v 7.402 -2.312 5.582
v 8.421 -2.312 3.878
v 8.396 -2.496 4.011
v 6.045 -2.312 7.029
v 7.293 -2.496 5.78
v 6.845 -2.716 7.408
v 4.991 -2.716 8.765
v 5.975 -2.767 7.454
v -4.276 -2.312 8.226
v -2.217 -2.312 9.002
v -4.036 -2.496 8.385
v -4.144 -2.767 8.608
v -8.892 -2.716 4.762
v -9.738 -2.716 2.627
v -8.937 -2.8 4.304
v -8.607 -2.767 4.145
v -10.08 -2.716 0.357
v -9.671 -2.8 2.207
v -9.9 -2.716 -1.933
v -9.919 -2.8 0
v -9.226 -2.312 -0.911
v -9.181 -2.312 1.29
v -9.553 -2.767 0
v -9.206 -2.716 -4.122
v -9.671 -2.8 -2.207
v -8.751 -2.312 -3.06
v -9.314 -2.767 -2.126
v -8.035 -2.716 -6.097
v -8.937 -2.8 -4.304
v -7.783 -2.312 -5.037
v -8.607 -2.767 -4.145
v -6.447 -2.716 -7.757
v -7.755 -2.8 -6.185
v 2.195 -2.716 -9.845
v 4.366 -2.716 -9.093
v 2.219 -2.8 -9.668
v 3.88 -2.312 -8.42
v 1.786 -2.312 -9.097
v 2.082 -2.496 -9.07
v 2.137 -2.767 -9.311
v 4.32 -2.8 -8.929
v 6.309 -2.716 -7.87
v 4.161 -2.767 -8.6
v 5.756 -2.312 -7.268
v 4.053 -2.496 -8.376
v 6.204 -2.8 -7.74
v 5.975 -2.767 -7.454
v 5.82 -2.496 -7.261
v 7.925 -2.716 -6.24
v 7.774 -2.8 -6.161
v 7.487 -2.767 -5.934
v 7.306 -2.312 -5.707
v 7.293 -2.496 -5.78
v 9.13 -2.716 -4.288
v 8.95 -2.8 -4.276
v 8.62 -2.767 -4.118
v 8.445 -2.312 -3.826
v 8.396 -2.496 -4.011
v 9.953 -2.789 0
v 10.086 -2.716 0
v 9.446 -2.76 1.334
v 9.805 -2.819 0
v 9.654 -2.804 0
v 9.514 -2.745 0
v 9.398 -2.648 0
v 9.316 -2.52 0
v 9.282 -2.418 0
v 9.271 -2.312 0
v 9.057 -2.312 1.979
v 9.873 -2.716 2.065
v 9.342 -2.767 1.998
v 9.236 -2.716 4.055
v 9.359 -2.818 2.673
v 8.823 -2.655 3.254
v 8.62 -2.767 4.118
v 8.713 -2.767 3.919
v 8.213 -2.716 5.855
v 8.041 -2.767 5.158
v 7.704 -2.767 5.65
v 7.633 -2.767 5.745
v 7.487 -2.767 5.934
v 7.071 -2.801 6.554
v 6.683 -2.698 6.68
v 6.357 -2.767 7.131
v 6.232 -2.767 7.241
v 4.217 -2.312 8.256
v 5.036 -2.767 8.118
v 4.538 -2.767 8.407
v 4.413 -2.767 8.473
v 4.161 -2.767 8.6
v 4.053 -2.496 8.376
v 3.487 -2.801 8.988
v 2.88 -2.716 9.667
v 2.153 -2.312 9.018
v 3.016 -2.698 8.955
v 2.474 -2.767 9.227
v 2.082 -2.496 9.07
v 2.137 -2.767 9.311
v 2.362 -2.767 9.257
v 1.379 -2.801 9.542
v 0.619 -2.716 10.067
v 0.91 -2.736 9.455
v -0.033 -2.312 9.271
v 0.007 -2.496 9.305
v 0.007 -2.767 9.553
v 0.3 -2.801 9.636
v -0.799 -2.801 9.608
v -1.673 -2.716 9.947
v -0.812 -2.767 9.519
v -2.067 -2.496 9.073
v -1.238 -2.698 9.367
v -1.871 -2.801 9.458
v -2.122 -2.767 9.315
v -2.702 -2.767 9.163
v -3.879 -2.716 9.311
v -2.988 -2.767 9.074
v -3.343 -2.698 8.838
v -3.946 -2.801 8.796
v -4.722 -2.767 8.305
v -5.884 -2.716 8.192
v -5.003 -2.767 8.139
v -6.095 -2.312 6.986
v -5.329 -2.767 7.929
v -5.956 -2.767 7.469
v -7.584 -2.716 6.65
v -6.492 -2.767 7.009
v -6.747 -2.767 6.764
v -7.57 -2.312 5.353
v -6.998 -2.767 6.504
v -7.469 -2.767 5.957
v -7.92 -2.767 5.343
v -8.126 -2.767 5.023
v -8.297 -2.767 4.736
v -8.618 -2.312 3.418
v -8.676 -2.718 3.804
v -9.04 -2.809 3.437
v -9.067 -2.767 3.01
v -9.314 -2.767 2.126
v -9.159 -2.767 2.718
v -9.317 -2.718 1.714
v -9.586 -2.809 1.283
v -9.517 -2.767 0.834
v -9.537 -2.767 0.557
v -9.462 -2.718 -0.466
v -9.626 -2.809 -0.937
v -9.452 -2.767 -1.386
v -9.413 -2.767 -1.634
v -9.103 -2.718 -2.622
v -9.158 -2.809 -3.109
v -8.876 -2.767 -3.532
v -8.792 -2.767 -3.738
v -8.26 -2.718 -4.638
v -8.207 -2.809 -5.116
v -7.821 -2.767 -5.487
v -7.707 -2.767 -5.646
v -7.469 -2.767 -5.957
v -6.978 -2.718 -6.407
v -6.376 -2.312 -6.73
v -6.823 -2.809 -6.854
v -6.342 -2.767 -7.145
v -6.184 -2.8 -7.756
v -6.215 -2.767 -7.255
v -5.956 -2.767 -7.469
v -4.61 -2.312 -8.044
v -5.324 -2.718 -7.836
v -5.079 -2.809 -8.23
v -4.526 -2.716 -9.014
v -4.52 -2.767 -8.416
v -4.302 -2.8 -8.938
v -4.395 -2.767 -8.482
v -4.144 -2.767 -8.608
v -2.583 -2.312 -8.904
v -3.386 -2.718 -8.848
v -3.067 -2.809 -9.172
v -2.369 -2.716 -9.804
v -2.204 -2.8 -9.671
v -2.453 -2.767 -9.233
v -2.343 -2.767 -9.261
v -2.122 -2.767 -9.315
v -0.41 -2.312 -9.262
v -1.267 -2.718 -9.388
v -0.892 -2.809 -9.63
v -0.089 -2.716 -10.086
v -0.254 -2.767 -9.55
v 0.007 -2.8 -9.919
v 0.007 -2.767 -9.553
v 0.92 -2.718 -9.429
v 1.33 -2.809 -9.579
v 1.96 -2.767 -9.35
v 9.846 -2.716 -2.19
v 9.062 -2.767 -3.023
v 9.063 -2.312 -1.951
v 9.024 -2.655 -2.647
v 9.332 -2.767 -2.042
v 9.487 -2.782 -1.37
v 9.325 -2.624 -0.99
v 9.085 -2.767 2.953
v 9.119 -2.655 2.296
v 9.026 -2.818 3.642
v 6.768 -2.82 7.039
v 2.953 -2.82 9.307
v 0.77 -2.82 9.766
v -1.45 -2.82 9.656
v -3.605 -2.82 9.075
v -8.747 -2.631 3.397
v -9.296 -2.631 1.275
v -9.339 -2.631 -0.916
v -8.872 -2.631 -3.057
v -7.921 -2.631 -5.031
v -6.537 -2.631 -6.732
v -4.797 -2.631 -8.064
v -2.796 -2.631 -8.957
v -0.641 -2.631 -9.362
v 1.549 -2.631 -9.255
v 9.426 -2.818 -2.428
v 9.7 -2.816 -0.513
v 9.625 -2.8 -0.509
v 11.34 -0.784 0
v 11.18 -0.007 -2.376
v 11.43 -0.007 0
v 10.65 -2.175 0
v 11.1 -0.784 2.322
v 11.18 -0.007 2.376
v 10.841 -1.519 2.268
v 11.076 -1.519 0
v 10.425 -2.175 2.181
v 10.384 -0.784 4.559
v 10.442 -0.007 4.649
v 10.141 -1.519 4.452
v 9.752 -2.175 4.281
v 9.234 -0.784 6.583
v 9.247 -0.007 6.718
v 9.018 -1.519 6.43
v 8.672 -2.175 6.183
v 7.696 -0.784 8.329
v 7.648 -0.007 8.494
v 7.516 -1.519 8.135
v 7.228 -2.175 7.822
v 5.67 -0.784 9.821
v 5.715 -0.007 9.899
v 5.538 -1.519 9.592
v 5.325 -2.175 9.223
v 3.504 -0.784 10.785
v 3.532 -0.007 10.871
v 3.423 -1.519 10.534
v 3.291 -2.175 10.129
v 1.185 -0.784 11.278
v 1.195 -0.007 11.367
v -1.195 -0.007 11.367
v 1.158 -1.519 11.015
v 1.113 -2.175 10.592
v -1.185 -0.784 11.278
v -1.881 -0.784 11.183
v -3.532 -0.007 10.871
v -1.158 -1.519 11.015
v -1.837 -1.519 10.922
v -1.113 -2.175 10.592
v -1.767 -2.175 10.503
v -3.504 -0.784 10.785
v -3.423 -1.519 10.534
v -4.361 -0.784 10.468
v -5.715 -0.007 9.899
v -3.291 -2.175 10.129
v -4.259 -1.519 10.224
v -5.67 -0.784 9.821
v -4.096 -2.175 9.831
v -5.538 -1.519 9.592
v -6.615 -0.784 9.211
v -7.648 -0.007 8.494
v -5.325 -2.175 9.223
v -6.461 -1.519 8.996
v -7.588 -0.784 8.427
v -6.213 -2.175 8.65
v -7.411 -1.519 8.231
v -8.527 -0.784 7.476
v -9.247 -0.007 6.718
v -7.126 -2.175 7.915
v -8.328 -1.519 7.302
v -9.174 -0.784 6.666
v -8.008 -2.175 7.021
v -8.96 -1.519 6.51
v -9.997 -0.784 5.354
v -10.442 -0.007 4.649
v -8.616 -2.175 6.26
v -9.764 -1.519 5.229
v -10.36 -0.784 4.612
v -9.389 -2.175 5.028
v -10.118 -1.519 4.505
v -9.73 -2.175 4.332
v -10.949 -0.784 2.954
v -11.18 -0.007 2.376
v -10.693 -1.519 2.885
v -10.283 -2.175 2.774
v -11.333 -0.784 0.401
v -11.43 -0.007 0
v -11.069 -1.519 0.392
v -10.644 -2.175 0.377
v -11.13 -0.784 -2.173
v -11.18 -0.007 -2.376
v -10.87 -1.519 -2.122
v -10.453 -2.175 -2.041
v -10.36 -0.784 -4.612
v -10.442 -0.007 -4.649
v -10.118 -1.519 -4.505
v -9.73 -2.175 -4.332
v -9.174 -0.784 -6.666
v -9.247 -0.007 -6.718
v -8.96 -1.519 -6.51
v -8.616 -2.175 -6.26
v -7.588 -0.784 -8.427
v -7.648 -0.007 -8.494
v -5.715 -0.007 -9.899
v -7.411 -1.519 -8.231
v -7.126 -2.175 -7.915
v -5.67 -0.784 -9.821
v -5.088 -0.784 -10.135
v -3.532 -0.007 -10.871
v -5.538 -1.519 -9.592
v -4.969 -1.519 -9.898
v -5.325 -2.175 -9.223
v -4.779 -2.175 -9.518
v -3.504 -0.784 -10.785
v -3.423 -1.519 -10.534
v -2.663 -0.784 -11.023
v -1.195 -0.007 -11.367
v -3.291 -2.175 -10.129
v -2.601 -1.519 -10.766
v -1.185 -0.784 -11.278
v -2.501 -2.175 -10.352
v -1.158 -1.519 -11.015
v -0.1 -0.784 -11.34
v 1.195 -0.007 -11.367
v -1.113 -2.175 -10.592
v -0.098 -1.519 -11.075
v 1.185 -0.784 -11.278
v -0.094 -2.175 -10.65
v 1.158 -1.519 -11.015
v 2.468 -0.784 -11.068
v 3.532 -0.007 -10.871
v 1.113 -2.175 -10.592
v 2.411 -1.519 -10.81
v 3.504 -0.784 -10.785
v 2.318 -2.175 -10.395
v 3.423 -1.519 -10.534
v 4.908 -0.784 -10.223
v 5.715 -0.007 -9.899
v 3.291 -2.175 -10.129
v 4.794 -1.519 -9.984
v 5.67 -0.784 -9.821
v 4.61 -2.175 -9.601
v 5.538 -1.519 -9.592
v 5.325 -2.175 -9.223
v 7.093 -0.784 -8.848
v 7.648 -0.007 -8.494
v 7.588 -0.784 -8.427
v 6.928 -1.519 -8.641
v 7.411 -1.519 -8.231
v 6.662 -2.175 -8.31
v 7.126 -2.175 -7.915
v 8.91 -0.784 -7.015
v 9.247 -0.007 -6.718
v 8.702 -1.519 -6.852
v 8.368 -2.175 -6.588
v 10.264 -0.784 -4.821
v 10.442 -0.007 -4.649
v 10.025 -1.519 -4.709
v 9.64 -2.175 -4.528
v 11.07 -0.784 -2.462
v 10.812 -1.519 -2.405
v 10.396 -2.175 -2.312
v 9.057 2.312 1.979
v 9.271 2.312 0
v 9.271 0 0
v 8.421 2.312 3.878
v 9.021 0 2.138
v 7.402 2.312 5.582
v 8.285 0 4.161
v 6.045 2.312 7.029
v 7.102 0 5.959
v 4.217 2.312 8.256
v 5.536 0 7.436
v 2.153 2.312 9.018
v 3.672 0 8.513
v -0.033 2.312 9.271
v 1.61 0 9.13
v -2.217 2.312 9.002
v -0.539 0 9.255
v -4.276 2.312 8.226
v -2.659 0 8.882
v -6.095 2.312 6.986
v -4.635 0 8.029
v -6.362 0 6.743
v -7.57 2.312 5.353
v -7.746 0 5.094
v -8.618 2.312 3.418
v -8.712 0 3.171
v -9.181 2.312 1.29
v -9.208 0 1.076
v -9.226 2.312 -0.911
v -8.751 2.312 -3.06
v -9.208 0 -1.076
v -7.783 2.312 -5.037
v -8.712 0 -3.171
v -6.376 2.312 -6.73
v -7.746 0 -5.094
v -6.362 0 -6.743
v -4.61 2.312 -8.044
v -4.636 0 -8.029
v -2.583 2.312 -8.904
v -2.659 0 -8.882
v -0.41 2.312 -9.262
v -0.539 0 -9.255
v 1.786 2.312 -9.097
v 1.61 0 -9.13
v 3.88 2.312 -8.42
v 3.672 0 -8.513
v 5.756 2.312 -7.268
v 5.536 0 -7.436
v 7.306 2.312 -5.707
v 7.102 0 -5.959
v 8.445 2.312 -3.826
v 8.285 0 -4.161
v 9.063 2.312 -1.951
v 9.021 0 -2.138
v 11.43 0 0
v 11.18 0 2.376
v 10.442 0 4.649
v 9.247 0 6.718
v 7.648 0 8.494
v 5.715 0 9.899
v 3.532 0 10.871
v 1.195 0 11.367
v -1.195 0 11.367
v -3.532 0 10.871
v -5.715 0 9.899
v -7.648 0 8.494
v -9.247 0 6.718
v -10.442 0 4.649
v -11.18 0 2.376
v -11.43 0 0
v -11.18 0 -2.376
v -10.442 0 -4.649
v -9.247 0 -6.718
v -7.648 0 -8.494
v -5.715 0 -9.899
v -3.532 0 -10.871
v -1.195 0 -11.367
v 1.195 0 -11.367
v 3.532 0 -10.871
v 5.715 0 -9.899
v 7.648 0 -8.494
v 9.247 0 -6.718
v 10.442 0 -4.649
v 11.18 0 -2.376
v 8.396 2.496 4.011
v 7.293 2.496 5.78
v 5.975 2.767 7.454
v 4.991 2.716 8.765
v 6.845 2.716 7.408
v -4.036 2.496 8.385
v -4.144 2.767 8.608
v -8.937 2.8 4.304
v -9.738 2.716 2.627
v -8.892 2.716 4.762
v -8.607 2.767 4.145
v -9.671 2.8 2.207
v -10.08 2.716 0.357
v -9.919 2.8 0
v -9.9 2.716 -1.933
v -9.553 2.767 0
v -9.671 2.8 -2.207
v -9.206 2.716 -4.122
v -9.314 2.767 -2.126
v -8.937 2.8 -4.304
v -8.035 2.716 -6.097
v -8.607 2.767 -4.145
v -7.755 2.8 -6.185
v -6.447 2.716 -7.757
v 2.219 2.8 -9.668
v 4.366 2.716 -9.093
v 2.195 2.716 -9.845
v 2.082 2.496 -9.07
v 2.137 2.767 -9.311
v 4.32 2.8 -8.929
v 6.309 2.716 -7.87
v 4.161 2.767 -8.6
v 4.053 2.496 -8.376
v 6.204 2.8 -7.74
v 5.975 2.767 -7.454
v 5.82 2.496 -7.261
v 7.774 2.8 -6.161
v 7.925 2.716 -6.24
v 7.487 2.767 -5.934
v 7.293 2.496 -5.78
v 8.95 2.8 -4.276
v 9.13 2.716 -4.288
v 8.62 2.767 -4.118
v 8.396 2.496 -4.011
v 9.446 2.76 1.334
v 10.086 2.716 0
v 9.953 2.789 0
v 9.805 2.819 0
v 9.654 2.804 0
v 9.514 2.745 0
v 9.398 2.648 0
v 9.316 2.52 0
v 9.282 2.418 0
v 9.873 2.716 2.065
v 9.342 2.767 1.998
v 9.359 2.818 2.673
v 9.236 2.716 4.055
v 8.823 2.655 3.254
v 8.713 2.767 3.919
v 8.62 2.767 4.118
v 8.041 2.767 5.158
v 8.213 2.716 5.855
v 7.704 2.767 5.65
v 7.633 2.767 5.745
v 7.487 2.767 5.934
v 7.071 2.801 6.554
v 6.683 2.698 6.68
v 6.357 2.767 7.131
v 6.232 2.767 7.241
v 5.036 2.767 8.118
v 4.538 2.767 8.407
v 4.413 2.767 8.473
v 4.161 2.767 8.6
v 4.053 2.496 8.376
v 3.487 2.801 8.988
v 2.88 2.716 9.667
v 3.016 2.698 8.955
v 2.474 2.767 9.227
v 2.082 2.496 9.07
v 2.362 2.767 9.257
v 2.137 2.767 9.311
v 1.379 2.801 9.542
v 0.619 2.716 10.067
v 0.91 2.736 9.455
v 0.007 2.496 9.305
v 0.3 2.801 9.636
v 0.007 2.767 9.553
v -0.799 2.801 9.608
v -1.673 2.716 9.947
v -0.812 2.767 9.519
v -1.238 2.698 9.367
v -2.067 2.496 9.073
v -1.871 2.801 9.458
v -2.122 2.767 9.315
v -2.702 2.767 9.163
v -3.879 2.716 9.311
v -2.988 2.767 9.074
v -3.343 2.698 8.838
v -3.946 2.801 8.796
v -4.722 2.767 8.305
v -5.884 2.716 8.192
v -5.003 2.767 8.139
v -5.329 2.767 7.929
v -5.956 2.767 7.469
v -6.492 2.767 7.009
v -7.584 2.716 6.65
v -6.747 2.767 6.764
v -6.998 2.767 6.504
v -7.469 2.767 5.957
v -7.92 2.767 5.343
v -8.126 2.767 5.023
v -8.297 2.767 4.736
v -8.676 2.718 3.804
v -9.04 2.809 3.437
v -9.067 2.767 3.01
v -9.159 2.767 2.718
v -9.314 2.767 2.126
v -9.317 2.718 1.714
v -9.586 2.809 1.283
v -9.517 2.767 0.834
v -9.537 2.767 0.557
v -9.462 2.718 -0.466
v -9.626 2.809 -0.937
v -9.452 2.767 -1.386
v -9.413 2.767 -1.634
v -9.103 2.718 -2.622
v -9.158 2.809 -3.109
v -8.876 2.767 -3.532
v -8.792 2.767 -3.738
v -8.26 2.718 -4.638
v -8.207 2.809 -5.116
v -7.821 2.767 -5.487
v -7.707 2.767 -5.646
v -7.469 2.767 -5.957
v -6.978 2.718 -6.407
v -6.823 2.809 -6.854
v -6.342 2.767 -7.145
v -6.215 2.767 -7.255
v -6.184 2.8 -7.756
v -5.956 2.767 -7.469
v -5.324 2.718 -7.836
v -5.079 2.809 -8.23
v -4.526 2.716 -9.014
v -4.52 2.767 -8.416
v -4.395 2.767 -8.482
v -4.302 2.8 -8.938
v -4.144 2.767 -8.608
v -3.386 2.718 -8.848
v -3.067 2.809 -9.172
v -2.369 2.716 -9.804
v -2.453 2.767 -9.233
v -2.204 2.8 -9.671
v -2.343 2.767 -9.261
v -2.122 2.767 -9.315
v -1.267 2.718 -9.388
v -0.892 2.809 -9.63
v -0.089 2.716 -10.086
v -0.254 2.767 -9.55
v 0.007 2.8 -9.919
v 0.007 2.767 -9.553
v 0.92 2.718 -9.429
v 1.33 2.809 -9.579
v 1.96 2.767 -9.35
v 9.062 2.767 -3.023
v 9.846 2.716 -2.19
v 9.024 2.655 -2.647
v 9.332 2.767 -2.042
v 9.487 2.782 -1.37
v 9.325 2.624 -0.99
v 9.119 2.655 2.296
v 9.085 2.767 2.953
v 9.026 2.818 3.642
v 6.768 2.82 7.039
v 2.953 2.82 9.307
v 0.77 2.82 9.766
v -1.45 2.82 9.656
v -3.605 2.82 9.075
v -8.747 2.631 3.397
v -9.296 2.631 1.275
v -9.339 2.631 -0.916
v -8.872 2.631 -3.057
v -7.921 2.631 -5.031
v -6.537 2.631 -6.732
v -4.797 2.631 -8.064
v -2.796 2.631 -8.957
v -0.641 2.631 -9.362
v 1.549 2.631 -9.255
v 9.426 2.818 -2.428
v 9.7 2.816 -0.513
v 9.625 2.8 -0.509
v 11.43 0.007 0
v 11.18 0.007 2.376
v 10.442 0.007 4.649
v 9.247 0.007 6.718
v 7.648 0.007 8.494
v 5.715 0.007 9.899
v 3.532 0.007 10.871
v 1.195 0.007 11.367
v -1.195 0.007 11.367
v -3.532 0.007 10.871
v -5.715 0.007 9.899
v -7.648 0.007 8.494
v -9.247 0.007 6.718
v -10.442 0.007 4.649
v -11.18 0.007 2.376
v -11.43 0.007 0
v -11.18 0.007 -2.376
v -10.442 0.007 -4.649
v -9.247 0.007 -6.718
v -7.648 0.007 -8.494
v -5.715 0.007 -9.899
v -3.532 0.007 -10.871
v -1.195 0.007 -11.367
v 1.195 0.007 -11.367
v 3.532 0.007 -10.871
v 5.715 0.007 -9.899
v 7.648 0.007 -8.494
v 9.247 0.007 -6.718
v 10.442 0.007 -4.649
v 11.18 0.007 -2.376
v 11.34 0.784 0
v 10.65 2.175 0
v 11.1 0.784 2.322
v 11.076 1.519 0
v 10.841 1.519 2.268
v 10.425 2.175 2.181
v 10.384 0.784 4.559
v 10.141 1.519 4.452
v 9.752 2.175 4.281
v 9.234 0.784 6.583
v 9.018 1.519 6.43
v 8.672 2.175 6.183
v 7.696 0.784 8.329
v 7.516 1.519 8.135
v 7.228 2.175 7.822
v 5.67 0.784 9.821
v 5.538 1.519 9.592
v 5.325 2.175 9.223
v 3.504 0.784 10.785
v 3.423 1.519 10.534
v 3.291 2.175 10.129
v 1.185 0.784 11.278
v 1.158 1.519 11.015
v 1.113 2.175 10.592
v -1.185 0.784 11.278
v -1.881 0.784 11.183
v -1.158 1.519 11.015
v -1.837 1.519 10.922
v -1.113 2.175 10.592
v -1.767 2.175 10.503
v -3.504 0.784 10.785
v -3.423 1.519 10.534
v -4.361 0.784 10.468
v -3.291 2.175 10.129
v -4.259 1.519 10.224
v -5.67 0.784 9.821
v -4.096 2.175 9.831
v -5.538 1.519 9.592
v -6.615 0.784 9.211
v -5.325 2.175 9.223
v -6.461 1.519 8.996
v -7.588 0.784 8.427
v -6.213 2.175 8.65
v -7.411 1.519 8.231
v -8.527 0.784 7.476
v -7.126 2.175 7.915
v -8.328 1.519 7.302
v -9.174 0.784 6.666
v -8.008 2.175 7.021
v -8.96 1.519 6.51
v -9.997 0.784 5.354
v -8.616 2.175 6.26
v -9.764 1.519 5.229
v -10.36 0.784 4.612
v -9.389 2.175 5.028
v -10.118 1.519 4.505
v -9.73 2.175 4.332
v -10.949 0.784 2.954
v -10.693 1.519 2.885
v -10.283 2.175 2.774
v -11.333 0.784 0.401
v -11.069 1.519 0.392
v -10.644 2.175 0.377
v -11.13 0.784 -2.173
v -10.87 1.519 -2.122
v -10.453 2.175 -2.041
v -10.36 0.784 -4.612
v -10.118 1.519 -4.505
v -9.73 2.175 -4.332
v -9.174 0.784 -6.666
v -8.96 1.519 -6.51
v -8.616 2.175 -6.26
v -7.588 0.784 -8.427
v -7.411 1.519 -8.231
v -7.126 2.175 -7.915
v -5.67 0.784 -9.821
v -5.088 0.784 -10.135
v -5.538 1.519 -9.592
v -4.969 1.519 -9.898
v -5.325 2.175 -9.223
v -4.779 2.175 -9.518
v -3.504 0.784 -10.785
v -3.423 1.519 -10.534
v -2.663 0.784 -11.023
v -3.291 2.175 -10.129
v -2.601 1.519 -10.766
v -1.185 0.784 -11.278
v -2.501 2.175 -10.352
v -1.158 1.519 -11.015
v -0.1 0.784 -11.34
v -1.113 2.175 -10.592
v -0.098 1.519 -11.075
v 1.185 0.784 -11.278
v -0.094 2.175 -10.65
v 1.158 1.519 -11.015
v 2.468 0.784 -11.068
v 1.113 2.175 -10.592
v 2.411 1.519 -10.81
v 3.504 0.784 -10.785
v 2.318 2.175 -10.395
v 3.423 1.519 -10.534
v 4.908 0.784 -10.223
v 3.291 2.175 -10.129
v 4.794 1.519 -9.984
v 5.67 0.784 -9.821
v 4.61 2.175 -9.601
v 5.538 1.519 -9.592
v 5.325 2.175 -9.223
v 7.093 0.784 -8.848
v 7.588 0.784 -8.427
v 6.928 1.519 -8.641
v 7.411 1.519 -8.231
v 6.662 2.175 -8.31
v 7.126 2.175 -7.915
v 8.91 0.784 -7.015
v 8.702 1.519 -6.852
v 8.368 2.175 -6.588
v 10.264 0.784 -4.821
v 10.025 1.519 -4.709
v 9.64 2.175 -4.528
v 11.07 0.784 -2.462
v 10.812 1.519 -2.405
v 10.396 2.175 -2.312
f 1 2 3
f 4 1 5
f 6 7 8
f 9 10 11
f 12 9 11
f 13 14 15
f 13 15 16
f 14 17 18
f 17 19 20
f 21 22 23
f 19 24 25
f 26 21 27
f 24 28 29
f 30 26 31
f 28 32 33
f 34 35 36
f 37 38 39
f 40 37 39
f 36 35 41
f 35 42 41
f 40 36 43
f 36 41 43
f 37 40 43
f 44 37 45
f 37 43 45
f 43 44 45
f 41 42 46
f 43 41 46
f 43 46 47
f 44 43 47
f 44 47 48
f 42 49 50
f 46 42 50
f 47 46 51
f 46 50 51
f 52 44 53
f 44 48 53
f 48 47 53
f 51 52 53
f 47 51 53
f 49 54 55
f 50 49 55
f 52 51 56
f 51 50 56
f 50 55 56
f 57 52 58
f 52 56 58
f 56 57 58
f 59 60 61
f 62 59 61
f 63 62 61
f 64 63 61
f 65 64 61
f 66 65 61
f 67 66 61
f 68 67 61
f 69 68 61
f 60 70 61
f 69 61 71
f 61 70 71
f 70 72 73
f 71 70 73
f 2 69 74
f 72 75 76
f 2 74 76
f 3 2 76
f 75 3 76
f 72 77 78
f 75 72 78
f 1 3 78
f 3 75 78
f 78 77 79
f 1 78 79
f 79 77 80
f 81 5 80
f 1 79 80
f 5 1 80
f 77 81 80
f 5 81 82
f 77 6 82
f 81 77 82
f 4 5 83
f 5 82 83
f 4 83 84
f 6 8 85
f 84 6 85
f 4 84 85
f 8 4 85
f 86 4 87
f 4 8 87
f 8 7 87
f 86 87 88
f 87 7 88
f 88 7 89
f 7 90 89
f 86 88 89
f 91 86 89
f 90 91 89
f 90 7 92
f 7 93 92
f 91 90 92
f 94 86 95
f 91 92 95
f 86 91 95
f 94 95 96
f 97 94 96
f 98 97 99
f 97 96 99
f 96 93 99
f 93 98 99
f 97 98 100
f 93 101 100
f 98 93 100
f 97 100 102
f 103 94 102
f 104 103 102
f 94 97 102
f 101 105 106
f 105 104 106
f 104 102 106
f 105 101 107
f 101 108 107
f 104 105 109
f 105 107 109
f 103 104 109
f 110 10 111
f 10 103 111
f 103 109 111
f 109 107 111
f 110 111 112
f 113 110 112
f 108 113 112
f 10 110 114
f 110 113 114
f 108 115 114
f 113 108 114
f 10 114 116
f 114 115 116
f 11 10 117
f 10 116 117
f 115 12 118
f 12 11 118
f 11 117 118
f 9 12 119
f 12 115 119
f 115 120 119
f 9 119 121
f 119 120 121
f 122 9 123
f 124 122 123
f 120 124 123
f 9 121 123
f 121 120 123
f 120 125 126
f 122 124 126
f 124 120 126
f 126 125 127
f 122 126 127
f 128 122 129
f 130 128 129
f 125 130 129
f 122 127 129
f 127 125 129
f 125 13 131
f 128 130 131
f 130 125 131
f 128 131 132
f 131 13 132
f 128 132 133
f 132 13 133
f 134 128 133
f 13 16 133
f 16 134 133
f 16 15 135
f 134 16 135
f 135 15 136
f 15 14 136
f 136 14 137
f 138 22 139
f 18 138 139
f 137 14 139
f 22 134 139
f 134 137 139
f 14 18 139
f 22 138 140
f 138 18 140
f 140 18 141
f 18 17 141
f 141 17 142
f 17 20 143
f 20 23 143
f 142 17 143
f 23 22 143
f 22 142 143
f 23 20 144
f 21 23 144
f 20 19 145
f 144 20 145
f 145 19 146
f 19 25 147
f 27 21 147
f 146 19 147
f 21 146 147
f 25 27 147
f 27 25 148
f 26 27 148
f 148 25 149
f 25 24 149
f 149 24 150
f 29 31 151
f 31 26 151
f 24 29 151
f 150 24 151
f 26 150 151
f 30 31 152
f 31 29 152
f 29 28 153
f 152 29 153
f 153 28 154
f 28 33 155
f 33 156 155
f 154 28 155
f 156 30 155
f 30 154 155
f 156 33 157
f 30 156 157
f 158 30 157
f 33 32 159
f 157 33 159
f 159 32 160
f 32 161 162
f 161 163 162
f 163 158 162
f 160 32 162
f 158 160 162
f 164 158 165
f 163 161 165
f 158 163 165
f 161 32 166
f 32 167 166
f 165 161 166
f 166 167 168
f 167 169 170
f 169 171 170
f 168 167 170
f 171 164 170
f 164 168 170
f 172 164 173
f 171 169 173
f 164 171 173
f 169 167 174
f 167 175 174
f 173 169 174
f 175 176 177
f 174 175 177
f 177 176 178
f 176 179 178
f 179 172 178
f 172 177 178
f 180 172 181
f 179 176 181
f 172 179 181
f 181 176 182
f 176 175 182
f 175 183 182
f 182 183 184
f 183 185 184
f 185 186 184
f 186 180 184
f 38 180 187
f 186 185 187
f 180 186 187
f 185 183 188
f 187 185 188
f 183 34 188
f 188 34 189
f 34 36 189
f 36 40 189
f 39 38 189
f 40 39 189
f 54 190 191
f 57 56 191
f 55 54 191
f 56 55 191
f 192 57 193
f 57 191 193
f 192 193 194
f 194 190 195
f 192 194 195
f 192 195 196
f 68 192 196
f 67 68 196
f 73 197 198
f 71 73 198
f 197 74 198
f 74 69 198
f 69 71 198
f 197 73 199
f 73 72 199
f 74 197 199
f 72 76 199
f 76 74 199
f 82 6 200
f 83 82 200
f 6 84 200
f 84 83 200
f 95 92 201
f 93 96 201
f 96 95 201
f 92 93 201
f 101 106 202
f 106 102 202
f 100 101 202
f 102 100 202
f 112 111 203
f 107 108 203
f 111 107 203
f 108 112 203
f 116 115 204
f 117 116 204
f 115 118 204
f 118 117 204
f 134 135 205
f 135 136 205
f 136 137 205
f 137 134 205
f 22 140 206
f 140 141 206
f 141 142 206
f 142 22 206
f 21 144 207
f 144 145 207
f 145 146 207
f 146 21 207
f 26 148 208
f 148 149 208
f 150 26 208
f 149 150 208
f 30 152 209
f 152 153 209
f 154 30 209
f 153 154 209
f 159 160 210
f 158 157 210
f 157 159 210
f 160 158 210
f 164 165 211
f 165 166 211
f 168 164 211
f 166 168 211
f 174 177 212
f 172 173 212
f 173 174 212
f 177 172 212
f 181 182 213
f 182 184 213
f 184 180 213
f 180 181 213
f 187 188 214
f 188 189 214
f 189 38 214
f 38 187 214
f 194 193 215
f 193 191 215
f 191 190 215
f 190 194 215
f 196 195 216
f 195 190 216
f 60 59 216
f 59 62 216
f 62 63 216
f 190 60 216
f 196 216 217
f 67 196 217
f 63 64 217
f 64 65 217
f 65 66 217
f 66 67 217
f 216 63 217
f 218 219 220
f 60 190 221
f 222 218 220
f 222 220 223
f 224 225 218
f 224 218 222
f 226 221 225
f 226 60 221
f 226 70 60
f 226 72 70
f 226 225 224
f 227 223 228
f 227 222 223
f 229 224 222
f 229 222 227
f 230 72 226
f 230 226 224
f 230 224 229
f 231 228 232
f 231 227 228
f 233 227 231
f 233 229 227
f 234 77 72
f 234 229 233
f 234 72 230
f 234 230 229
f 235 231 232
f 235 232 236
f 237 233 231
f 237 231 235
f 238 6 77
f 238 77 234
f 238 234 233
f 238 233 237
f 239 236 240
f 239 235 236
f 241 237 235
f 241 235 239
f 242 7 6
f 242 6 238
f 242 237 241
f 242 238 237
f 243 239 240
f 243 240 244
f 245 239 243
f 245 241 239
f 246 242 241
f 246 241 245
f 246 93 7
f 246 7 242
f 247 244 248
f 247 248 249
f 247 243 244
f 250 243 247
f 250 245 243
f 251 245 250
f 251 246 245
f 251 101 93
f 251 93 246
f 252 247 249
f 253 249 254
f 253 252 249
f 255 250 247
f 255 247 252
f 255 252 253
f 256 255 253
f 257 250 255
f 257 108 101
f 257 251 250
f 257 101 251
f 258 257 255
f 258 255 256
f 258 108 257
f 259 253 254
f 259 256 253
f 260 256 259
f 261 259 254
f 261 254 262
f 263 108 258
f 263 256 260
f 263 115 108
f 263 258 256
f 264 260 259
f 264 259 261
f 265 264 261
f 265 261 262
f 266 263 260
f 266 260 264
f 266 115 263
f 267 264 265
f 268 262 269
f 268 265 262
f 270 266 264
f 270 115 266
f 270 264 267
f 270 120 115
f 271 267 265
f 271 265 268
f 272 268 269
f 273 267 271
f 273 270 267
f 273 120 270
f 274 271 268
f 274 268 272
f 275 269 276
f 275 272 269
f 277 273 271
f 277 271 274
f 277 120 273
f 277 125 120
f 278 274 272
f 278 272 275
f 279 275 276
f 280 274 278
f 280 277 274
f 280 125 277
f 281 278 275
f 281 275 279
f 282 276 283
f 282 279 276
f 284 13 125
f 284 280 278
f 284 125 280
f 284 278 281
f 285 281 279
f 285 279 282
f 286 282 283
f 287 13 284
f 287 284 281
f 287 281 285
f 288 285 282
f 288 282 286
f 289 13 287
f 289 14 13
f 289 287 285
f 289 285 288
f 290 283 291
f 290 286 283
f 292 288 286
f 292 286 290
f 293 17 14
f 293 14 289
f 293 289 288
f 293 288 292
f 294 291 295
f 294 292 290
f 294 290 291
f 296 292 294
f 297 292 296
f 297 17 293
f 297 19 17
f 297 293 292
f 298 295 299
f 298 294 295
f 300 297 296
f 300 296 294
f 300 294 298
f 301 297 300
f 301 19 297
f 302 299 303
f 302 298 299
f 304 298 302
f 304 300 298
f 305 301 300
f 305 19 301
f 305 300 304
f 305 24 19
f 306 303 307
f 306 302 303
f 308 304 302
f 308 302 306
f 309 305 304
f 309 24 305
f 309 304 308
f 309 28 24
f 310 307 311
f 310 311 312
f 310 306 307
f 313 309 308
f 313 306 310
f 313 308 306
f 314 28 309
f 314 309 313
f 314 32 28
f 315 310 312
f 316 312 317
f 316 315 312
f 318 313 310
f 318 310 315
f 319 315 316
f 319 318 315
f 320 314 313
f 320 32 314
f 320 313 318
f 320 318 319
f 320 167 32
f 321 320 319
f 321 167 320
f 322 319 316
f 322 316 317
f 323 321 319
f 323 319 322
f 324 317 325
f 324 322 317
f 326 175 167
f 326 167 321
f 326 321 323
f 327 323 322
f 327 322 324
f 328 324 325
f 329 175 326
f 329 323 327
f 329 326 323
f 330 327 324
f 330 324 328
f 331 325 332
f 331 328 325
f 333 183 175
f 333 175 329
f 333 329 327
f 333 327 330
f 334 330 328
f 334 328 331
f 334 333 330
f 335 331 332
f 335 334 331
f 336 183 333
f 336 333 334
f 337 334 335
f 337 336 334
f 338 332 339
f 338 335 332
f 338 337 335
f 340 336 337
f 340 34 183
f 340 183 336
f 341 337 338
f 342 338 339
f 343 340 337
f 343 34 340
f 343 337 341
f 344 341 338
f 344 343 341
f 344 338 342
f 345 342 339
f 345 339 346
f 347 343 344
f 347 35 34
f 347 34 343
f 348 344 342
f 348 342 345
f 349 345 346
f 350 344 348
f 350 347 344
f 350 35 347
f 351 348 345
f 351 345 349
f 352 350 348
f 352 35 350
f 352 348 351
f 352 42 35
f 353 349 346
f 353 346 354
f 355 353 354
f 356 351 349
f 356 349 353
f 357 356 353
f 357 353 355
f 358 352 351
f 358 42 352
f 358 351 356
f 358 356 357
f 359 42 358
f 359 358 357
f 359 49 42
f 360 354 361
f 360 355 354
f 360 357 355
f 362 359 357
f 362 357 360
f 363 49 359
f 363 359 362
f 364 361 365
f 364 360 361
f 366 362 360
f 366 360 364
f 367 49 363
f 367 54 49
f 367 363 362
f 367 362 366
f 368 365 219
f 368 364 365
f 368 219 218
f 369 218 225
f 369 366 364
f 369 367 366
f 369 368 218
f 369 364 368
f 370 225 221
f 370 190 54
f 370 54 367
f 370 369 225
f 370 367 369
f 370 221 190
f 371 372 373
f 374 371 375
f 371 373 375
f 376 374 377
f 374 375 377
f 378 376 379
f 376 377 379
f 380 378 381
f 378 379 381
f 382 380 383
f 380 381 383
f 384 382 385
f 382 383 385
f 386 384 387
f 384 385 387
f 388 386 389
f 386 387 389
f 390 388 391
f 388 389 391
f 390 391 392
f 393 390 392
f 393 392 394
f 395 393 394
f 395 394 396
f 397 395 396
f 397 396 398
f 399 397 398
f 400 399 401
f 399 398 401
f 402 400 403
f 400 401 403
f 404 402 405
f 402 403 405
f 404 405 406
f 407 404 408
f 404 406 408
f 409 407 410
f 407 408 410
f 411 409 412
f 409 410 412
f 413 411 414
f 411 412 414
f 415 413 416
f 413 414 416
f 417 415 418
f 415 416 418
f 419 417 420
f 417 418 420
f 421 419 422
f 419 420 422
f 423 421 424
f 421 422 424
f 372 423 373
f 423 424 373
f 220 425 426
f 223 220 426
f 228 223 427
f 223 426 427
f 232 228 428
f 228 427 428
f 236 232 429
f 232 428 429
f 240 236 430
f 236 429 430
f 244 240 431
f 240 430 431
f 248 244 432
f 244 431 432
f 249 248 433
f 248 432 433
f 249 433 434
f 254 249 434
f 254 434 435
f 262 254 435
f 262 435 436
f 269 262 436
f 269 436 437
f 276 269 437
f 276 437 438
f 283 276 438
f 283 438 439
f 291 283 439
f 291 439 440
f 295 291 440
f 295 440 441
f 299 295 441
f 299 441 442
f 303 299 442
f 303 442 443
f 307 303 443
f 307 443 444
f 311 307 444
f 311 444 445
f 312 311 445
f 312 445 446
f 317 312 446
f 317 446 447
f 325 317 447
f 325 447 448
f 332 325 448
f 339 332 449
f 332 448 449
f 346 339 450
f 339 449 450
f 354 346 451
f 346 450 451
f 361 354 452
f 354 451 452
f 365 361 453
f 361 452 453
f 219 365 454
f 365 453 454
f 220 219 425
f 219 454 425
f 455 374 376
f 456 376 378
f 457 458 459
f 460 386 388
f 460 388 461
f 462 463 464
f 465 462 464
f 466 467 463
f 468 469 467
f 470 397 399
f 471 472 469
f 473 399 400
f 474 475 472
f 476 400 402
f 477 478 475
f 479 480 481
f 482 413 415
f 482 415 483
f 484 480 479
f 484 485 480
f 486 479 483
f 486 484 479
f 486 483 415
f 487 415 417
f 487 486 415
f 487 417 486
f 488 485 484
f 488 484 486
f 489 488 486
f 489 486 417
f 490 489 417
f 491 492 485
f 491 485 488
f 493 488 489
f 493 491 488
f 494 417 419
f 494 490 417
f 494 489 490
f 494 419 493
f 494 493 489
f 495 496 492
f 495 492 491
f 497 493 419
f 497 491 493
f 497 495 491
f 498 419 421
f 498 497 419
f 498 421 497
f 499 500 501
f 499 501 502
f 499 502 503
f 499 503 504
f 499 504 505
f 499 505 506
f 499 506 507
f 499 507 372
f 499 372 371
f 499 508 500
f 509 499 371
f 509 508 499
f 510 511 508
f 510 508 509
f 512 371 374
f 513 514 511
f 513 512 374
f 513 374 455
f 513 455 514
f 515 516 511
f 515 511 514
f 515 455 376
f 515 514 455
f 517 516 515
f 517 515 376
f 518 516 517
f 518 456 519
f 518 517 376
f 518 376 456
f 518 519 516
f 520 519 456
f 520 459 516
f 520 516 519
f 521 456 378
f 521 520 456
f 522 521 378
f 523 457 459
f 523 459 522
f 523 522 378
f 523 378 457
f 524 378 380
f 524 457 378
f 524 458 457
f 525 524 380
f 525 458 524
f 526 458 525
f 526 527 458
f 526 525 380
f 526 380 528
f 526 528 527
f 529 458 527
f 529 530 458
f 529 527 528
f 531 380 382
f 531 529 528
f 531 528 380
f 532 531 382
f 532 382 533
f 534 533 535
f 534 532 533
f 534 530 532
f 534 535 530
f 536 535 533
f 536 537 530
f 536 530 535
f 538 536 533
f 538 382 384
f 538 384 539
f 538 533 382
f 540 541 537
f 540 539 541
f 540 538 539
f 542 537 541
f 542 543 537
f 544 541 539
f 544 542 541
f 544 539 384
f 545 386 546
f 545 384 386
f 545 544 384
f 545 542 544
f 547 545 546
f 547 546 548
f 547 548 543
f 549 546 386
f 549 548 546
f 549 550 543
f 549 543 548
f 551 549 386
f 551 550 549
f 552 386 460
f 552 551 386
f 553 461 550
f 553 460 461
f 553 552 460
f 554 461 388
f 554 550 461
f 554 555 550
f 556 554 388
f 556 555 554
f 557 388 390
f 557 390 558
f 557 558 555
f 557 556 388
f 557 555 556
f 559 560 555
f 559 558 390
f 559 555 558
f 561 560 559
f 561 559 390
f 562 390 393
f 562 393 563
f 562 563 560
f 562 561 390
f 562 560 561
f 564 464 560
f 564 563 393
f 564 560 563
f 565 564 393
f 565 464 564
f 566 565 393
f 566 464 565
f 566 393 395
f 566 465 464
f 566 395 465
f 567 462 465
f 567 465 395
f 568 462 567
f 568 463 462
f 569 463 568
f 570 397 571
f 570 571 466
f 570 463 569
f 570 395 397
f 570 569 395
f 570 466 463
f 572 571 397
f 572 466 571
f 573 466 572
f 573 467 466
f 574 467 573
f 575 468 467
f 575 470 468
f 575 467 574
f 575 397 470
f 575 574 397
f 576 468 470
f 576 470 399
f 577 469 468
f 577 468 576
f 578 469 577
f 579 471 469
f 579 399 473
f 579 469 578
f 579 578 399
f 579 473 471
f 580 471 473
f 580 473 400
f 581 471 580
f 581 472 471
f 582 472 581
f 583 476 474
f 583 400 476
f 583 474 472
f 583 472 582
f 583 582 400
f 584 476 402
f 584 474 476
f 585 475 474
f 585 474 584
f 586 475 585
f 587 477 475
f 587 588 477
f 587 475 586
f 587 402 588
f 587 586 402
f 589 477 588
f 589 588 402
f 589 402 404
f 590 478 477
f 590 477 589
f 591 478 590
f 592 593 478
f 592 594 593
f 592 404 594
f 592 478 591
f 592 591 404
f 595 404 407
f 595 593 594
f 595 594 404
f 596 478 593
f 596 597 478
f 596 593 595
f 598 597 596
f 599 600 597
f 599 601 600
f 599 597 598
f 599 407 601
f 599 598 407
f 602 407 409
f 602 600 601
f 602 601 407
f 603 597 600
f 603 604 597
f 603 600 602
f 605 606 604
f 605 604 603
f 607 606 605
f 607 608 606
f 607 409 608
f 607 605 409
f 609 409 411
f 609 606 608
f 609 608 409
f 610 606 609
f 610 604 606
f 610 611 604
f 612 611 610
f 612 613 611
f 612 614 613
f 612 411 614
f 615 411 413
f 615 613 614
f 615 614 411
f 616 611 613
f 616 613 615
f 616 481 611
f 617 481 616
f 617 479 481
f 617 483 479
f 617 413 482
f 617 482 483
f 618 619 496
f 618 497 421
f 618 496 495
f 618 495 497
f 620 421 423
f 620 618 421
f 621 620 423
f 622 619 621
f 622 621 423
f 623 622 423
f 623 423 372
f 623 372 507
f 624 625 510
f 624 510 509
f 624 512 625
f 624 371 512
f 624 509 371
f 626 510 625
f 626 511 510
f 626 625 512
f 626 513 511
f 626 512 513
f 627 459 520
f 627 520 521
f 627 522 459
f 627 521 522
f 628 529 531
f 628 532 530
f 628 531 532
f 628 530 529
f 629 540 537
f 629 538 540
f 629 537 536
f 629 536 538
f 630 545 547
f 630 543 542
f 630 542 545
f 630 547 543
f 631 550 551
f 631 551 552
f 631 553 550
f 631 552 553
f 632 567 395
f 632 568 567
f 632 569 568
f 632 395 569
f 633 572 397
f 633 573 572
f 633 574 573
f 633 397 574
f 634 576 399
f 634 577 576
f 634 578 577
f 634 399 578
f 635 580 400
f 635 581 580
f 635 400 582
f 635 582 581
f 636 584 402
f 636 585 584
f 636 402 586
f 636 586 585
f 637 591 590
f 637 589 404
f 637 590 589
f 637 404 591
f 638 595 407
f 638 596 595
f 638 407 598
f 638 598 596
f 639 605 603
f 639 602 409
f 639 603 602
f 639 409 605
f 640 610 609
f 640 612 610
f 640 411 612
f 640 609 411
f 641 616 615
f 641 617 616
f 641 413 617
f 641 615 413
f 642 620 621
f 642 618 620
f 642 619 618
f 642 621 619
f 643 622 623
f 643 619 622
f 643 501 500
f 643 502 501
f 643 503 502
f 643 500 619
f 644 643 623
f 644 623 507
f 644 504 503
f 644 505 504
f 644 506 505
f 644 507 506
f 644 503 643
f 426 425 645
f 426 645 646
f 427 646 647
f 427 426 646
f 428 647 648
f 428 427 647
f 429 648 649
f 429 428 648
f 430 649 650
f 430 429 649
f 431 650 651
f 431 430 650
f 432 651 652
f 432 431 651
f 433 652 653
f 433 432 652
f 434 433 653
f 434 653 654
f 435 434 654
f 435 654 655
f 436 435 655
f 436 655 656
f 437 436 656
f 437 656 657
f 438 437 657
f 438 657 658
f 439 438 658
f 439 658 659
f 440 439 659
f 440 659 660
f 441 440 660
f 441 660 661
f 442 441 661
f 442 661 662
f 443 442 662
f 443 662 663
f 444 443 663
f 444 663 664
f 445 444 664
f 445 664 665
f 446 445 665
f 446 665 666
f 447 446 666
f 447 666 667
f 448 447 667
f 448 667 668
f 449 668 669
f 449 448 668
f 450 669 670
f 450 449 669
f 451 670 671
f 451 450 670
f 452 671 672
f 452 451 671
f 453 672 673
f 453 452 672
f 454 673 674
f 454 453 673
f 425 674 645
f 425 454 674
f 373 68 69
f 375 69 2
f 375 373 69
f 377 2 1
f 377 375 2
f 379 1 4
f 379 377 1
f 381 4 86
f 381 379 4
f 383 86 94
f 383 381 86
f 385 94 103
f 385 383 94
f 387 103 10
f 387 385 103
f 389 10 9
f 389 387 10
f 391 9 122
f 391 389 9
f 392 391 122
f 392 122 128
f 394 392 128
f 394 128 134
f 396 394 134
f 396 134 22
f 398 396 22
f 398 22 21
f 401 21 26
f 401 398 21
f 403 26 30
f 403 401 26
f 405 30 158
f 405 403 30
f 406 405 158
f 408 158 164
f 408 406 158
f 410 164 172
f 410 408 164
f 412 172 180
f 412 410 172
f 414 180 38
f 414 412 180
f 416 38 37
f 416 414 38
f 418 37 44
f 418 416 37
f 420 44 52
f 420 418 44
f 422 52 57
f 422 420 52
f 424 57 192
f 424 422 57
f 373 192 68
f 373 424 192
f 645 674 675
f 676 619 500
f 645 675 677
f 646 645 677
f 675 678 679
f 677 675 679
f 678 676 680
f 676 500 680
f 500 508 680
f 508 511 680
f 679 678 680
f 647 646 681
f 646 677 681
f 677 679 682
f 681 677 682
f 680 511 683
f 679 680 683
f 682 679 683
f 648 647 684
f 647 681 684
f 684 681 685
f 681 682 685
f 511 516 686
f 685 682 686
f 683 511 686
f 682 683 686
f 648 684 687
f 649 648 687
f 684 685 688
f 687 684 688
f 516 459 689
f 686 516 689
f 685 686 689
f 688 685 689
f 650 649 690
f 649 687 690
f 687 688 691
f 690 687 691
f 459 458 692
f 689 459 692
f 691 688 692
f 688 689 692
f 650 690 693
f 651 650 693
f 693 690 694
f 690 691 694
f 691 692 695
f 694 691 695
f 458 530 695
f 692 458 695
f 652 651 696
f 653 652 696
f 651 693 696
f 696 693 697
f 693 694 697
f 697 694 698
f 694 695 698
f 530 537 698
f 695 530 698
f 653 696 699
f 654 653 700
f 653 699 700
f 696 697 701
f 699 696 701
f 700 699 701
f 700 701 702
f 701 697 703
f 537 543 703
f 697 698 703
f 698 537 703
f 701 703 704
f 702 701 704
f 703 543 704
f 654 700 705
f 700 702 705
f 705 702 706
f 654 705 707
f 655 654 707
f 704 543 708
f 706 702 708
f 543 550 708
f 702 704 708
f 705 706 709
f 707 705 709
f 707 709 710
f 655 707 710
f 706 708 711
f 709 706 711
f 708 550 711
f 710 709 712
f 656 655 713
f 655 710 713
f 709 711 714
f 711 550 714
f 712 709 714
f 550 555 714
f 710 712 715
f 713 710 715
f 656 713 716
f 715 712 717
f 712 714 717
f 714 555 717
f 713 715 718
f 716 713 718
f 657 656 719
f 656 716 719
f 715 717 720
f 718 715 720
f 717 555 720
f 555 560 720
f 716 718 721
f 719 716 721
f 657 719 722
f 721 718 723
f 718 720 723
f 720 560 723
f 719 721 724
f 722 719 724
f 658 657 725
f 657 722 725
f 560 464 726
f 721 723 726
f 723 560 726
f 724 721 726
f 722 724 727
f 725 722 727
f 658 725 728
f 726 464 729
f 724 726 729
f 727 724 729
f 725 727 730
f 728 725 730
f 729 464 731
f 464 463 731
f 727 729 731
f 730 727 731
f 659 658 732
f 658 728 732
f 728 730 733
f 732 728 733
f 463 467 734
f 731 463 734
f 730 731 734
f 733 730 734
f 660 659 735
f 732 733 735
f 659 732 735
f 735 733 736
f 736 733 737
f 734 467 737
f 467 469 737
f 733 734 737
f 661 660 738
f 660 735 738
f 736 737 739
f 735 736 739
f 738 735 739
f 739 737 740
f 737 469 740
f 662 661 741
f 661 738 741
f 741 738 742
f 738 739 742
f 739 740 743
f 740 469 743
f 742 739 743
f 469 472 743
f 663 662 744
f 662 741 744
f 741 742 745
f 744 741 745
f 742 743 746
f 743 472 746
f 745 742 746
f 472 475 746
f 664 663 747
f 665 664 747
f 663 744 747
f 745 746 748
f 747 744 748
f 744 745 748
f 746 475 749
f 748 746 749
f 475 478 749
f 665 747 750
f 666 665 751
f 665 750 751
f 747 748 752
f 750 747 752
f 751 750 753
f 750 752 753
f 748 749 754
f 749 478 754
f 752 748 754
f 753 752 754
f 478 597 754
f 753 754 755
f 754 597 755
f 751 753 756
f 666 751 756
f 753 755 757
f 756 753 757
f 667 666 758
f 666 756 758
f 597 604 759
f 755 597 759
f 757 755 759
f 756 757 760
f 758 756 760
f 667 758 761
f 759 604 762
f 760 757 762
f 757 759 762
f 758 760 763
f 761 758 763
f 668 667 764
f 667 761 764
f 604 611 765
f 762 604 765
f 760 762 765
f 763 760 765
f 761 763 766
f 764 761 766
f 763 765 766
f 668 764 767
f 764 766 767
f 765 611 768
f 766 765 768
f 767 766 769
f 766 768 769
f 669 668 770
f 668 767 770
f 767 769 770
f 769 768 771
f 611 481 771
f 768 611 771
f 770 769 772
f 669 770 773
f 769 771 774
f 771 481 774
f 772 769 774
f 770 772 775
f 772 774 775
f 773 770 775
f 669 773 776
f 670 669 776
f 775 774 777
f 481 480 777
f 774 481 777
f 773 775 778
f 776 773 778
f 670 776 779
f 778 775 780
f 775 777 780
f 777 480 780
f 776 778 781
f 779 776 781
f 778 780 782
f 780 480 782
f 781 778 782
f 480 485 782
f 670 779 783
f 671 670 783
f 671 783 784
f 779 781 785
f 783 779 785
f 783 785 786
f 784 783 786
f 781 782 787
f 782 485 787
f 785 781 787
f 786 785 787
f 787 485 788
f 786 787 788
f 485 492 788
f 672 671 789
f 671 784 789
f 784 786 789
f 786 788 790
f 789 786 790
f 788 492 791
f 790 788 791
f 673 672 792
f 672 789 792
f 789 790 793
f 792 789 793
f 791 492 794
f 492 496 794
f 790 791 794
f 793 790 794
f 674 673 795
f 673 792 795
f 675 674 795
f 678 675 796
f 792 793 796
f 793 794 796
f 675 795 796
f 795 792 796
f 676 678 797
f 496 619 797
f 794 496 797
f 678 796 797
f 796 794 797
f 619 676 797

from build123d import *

# Parameters (mm, degrees)
F0_R     = 11.43
F0_R_2   = 9.271
F1_DEPTH = 3.175
F3_R     = 0.508


# Not quite as in the source:
# - a fillet or chamfer that OpenCascade refuses, or shapes differently, is made with other operations: its cross-section is extruded or revolved along the edge and cut away or added


with BuildPart() as f1:
    # F0 (on Front) → F1 (new body)
    with BuildSketch(Plane.XZ):
        Circle(F0_R)
        Circle(F0_R_2, mode=Mode.SUBTRACT)
    extrude(amount=F1_DEPTH)

    # F2: fillet of radius 3.4036 on 1 edges, made by hand

    # F2_s1 → F2_t2 (revolve, cut)
    with BuildSketch(Plane.XY):
        with BuildLine():
            ThreePointArc((11.43, -0.0071199833), (10.8389267572, -1.9239366673), (9.271, -3.175))
            Line((9.271, -3.175), (9.295892, -3.2383576003))
            ThreePointArc((9.295892, -3.2383576003), (10.3505, -3.243072), (11.43, -3.243072))
            Line((11.43, -3.243072), (11.498072, -3.175))
            Line((11.498072, -3.175), (11.498072, -0.0071199833))
            Line((11.498072, -0.0071199833), (11.43, -0.0071199833))
        make_face()
    revolve(axis=Axis((0, -3.175, 0), (0, -1, 0)), mode=Mode.SUBTRACT)

    # F3
    f3_edges = [f1.edges().sort_by_distance(p)[0] for p in [
        (-9.271, -3.175, 0),
    ]]
    fillet(f3_edges, radius=F3_R)

    # F4: F1 across plane


with BuildPart() as f1_1:
    add(f1.part)
    add(f1.part.mirror(Plane.XZ))


solid = f1_1.part
